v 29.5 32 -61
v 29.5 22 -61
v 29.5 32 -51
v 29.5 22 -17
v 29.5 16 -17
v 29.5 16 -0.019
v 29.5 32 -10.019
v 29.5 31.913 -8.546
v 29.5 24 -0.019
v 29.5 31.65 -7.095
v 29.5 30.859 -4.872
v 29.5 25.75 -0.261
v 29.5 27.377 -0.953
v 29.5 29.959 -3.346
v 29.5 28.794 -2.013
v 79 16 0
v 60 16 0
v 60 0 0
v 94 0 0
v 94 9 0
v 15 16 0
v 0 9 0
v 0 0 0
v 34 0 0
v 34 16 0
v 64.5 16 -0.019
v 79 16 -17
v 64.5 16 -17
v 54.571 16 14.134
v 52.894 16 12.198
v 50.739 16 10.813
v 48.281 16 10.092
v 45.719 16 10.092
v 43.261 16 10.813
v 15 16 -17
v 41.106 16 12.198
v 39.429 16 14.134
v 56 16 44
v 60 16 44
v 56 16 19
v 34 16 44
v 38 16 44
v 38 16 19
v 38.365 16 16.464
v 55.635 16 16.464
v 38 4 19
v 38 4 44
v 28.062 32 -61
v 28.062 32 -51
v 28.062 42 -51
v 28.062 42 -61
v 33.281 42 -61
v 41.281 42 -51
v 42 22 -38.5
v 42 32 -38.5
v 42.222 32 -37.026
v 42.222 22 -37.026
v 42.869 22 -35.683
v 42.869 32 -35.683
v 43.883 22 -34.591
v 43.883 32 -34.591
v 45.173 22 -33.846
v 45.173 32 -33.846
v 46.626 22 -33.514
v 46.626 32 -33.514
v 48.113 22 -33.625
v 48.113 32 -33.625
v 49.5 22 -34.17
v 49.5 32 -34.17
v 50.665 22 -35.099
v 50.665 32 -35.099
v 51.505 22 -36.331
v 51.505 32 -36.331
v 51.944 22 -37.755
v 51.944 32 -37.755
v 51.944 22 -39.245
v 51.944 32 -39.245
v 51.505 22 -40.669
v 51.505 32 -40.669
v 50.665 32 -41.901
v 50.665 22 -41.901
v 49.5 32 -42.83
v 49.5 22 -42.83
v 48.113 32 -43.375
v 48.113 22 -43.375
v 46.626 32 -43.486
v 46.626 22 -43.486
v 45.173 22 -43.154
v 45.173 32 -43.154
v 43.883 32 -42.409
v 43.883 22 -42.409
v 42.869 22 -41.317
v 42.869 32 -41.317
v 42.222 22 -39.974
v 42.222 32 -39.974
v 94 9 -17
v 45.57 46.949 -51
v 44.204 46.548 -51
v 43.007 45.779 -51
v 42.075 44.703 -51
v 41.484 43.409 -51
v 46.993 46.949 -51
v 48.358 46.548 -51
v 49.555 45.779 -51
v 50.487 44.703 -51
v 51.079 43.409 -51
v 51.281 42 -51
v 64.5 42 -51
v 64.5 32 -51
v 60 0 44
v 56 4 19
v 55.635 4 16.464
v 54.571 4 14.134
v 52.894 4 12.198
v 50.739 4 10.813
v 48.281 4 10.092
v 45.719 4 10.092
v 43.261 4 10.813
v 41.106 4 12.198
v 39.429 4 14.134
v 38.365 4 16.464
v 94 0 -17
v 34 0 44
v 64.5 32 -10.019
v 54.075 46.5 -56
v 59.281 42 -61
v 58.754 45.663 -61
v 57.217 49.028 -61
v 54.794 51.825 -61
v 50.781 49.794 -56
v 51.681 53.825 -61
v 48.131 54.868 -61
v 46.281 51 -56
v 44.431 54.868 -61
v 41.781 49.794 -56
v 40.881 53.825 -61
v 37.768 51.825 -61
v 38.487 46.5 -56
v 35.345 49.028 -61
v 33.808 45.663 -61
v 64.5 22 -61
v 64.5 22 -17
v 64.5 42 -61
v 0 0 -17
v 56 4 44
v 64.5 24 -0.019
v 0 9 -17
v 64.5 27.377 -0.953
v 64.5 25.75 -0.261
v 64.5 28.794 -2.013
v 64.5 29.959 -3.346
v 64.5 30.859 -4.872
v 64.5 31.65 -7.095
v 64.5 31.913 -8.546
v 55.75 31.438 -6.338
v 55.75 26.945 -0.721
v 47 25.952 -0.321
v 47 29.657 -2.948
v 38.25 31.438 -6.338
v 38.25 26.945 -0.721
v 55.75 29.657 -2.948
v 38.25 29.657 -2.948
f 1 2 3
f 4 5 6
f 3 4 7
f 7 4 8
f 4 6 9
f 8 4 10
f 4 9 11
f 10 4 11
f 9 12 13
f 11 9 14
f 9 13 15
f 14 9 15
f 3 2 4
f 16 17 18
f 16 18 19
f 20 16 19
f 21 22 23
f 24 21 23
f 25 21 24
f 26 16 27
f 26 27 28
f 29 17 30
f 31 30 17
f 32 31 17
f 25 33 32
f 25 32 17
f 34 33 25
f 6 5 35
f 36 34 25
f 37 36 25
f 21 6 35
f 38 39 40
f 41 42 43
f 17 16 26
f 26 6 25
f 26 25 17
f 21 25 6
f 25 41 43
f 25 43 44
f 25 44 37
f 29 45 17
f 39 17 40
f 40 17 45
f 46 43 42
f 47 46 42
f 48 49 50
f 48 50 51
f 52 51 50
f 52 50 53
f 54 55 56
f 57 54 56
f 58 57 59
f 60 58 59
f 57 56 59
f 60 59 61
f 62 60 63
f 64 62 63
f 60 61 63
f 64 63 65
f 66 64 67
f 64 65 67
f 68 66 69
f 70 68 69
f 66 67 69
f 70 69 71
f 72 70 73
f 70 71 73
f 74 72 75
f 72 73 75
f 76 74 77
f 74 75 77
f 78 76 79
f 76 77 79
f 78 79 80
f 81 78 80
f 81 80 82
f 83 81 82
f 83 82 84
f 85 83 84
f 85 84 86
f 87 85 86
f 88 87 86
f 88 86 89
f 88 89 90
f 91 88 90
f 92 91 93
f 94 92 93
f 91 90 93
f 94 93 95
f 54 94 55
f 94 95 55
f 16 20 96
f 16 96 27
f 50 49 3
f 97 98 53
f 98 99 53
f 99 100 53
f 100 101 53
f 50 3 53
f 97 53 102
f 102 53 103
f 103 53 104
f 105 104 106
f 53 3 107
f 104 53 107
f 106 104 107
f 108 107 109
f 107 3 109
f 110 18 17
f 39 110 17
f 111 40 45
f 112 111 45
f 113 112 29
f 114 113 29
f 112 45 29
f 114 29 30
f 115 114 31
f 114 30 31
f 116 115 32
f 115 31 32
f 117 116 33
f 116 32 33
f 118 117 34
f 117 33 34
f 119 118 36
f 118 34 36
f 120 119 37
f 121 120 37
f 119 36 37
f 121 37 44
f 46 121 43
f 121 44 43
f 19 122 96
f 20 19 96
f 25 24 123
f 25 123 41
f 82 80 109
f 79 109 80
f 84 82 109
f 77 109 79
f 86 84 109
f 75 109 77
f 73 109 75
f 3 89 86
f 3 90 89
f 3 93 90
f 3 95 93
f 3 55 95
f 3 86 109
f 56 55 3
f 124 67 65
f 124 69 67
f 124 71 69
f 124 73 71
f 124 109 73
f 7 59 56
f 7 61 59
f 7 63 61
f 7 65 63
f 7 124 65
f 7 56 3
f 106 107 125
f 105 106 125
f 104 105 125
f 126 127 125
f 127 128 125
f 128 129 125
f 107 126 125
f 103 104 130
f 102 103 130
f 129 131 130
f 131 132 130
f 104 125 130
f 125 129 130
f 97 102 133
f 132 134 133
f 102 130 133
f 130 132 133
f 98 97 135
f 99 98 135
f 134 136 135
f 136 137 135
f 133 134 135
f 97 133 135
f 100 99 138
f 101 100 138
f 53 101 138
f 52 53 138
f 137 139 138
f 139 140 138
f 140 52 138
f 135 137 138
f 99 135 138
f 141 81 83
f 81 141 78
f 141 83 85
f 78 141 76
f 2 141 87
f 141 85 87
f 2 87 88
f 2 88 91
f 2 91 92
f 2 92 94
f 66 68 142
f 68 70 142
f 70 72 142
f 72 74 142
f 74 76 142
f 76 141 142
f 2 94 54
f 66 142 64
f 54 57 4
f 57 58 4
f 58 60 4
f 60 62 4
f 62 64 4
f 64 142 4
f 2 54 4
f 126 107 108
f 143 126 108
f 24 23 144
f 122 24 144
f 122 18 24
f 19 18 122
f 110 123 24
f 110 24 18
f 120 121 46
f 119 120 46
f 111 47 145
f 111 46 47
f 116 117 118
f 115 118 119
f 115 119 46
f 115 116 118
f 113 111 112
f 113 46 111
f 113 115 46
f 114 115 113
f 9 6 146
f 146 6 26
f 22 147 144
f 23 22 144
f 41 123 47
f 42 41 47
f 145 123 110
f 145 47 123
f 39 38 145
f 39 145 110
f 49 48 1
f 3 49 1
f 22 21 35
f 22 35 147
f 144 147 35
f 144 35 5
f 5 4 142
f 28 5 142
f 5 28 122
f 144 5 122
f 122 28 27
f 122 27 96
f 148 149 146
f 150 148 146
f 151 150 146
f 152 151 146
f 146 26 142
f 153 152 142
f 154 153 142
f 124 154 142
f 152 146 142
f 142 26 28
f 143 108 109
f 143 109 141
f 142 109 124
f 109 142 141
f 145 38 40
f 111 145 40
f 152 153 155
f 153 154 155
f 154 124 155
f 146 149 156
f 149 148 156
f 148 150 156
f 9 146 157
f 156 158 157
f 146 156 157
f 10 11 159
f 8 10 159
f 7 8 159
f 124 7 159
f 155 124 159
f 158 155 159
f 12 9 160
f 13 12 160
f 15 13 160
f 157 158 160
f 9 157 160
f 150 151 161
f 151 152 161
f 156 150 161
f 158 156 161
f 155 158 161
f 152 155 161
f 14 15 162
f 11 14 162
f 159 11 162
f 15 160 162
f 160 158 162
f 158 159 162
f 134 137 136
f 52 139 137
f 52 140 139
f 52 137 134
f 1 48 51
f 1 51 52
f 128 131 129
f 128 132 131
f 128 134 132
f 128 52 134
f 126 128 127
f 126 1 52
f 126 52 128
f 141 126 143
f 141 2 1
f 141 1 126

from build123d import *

# Parameters (mm, degrees)
BOSS_EXTRU_1_DEPTH      = 17
ESQUISSE2_W             = 26
ESQUISSE2_H             = 16
BOSS_EXTRU_2_DEPTH      = 44
ENL_V_MAT_EXTRU_1_DEPTH = 12
ESQUISSE4_W             = 35
ESQUISSE4_H             = 16.981352254
BOSS_EXTRU_3_DEPTH      = 16
ESQUISSE5_W             = 35
ESQUISSE5_H             = 10
BOSS_EXTRU_4_DEPTH      = 44
ESQUISSE6_W             = 36.437850792
ESQUISSE6_H             = 10
BOSS_EXTRU_5_DEPTH      = 10
CONG_1_SIZE             = 10
CONG_1_SIZE_2           = 8
ESQUISSE8_R             = 5
ENL_V_MAT_EXTRU_2_DEPTH = 10


with BuildPart() as part:
    # Esquisse1 → Boss.-Extru.1 (new body)
    with BuildSketch(Plane.XY):
        Polygon((0, 0), (94, 0), (94, 9), (79, 16), (15, 16), (0, 9), align=None)
    extrude(amount=-BOSS_EXTRU_1_DEPTH)

    # Esquisse2 → Boss.-Extru.2 (add)
    with BuildSketch(Plane.XY):
        with Locations((47, 8)):
            Rectangle(ESQUISSE2_W, ESQUISSE2_H)
    extrude(amount=BOSS_EXTRU_2_DEPTH)

    # Esquisse3 → Enlèv. mat.-Extru.1 (cut)
    with BuildSketch(Plane(origin=(0, 16, 0), x_dir=(1, 0, 0), z_dir=(0, 1, 0))):
        with BuildLine():
            Line((38, -44), (56, -44))
            Line((56, -44), (56, -19))
            ThreePointArc((56, -19), (47, -10), (38, -19))
            Line((38, -19), (38, -44))
        make_face()
    extrude(amount=-ENL_V_MAT_EXTRU_1_DEPTH, mode=Mode.SUBTRACT)

    # Esquisse4 → Boss.-Extru.3 (add)
    with BuildSketch(Plane(origin=(0, 16, 0), x_dir=(1, 0, 0), z_dir=(0, 1, 0))):
        with Locations((47, 8.509323873)):
            Rectangle(ESQUISSE4_W, ESQUISSE4_H)
    extrude(amount=BOSS_EXTRU_3_DEPTH)

    # Esquisse5 → Boss.-Extru.4 (add)
    with BuildSketch(Plane(origin=(0, 0, -17), x_dir=(-1, 0, 0), z_dir=(0, 0, -1))):
        with Locations((-47, 27)):
            Rectangle(ESQUISSE5_W, ESQUISSE5_H)
    extrude(amount=BOSS_EXTRU_4_DEPTH)

    # Esquisse6 → Boss.-Extru.5 (add)
    with BuildSketch(Plane(origin=(0, 32, 0), x_dir=(1, 0, 0), z_dir=(0, 1, 0))):
        with Locations((46.281074604, 56)):
            Rectangle(ESQUISSE6_W, ESQUISSE6_H)
    extrude(amount=BOSS_EXTRU_5_DEPTH)

    # Congé1
    # an asymmetric fillet: 10, 8 mm, written as the material it takes off along each edge
    with BuildSketch(Plane(origin=(4.5, 32, -0.018647746), x_dir=(0, 0, -1), z_dir=(1, 0, 0))) as cong_1_piece_1:
        with BuildLine():
            Bezier((CONG_1_SIZE, 0), (0, 0), (0, -CONG_1_SIZE_2), weights=[1, 0.707106781, 1])
            Line((0, -CONG_1_SIZE_2), (0, 0))
            Line((0, 0), (CONG_1_SIZE, 0))
        make_face()
    extrude(amount=85, mode=Mode.SUBTRACT)

    # Esquisse8 → Enlèv. mat.-Extru.2 (cut)
    with BuildSketch(Plane(origin=(0, 32, 0), x_dir=(1, 0, 0), z_dir=(0, 1, 0))):
        with Locations(Location((47, 38.5, 0), (0, 0, 180))):
            Circle(ESQUISSE8_R)
    extrude(amount=-ENL_V_MAT_EXTRU_2_DEPTH, mode=Mode.SUBTRACT)

    # Esquisse9 → Lissage2 section 0
    with BuildSketch(Plane.XY.offset(-51)):
        with BuildLine():
            Line((41.281074604, 42), (51.281074604, 42))
            ThreePointArc((51.281074604, 42), (46.281074604, 47), (41.281074604, 42))
        make_face()
    # Esquisse10 → Lissage2 section 1
    with BuildSketch(Plane(origin=(0, 0, -61), x_dir=(-1, 0, 0), z_dir=(0, 0, -1))):
        with BuildLine():
            Line((-33.281074604, 42), (-59.281074604, 42))
            ThreePointArc((-59.281074604, 42), (-46.281074604, 55), (-33.281074604, 42))
        make_face()
    loft()


solid = part.part
